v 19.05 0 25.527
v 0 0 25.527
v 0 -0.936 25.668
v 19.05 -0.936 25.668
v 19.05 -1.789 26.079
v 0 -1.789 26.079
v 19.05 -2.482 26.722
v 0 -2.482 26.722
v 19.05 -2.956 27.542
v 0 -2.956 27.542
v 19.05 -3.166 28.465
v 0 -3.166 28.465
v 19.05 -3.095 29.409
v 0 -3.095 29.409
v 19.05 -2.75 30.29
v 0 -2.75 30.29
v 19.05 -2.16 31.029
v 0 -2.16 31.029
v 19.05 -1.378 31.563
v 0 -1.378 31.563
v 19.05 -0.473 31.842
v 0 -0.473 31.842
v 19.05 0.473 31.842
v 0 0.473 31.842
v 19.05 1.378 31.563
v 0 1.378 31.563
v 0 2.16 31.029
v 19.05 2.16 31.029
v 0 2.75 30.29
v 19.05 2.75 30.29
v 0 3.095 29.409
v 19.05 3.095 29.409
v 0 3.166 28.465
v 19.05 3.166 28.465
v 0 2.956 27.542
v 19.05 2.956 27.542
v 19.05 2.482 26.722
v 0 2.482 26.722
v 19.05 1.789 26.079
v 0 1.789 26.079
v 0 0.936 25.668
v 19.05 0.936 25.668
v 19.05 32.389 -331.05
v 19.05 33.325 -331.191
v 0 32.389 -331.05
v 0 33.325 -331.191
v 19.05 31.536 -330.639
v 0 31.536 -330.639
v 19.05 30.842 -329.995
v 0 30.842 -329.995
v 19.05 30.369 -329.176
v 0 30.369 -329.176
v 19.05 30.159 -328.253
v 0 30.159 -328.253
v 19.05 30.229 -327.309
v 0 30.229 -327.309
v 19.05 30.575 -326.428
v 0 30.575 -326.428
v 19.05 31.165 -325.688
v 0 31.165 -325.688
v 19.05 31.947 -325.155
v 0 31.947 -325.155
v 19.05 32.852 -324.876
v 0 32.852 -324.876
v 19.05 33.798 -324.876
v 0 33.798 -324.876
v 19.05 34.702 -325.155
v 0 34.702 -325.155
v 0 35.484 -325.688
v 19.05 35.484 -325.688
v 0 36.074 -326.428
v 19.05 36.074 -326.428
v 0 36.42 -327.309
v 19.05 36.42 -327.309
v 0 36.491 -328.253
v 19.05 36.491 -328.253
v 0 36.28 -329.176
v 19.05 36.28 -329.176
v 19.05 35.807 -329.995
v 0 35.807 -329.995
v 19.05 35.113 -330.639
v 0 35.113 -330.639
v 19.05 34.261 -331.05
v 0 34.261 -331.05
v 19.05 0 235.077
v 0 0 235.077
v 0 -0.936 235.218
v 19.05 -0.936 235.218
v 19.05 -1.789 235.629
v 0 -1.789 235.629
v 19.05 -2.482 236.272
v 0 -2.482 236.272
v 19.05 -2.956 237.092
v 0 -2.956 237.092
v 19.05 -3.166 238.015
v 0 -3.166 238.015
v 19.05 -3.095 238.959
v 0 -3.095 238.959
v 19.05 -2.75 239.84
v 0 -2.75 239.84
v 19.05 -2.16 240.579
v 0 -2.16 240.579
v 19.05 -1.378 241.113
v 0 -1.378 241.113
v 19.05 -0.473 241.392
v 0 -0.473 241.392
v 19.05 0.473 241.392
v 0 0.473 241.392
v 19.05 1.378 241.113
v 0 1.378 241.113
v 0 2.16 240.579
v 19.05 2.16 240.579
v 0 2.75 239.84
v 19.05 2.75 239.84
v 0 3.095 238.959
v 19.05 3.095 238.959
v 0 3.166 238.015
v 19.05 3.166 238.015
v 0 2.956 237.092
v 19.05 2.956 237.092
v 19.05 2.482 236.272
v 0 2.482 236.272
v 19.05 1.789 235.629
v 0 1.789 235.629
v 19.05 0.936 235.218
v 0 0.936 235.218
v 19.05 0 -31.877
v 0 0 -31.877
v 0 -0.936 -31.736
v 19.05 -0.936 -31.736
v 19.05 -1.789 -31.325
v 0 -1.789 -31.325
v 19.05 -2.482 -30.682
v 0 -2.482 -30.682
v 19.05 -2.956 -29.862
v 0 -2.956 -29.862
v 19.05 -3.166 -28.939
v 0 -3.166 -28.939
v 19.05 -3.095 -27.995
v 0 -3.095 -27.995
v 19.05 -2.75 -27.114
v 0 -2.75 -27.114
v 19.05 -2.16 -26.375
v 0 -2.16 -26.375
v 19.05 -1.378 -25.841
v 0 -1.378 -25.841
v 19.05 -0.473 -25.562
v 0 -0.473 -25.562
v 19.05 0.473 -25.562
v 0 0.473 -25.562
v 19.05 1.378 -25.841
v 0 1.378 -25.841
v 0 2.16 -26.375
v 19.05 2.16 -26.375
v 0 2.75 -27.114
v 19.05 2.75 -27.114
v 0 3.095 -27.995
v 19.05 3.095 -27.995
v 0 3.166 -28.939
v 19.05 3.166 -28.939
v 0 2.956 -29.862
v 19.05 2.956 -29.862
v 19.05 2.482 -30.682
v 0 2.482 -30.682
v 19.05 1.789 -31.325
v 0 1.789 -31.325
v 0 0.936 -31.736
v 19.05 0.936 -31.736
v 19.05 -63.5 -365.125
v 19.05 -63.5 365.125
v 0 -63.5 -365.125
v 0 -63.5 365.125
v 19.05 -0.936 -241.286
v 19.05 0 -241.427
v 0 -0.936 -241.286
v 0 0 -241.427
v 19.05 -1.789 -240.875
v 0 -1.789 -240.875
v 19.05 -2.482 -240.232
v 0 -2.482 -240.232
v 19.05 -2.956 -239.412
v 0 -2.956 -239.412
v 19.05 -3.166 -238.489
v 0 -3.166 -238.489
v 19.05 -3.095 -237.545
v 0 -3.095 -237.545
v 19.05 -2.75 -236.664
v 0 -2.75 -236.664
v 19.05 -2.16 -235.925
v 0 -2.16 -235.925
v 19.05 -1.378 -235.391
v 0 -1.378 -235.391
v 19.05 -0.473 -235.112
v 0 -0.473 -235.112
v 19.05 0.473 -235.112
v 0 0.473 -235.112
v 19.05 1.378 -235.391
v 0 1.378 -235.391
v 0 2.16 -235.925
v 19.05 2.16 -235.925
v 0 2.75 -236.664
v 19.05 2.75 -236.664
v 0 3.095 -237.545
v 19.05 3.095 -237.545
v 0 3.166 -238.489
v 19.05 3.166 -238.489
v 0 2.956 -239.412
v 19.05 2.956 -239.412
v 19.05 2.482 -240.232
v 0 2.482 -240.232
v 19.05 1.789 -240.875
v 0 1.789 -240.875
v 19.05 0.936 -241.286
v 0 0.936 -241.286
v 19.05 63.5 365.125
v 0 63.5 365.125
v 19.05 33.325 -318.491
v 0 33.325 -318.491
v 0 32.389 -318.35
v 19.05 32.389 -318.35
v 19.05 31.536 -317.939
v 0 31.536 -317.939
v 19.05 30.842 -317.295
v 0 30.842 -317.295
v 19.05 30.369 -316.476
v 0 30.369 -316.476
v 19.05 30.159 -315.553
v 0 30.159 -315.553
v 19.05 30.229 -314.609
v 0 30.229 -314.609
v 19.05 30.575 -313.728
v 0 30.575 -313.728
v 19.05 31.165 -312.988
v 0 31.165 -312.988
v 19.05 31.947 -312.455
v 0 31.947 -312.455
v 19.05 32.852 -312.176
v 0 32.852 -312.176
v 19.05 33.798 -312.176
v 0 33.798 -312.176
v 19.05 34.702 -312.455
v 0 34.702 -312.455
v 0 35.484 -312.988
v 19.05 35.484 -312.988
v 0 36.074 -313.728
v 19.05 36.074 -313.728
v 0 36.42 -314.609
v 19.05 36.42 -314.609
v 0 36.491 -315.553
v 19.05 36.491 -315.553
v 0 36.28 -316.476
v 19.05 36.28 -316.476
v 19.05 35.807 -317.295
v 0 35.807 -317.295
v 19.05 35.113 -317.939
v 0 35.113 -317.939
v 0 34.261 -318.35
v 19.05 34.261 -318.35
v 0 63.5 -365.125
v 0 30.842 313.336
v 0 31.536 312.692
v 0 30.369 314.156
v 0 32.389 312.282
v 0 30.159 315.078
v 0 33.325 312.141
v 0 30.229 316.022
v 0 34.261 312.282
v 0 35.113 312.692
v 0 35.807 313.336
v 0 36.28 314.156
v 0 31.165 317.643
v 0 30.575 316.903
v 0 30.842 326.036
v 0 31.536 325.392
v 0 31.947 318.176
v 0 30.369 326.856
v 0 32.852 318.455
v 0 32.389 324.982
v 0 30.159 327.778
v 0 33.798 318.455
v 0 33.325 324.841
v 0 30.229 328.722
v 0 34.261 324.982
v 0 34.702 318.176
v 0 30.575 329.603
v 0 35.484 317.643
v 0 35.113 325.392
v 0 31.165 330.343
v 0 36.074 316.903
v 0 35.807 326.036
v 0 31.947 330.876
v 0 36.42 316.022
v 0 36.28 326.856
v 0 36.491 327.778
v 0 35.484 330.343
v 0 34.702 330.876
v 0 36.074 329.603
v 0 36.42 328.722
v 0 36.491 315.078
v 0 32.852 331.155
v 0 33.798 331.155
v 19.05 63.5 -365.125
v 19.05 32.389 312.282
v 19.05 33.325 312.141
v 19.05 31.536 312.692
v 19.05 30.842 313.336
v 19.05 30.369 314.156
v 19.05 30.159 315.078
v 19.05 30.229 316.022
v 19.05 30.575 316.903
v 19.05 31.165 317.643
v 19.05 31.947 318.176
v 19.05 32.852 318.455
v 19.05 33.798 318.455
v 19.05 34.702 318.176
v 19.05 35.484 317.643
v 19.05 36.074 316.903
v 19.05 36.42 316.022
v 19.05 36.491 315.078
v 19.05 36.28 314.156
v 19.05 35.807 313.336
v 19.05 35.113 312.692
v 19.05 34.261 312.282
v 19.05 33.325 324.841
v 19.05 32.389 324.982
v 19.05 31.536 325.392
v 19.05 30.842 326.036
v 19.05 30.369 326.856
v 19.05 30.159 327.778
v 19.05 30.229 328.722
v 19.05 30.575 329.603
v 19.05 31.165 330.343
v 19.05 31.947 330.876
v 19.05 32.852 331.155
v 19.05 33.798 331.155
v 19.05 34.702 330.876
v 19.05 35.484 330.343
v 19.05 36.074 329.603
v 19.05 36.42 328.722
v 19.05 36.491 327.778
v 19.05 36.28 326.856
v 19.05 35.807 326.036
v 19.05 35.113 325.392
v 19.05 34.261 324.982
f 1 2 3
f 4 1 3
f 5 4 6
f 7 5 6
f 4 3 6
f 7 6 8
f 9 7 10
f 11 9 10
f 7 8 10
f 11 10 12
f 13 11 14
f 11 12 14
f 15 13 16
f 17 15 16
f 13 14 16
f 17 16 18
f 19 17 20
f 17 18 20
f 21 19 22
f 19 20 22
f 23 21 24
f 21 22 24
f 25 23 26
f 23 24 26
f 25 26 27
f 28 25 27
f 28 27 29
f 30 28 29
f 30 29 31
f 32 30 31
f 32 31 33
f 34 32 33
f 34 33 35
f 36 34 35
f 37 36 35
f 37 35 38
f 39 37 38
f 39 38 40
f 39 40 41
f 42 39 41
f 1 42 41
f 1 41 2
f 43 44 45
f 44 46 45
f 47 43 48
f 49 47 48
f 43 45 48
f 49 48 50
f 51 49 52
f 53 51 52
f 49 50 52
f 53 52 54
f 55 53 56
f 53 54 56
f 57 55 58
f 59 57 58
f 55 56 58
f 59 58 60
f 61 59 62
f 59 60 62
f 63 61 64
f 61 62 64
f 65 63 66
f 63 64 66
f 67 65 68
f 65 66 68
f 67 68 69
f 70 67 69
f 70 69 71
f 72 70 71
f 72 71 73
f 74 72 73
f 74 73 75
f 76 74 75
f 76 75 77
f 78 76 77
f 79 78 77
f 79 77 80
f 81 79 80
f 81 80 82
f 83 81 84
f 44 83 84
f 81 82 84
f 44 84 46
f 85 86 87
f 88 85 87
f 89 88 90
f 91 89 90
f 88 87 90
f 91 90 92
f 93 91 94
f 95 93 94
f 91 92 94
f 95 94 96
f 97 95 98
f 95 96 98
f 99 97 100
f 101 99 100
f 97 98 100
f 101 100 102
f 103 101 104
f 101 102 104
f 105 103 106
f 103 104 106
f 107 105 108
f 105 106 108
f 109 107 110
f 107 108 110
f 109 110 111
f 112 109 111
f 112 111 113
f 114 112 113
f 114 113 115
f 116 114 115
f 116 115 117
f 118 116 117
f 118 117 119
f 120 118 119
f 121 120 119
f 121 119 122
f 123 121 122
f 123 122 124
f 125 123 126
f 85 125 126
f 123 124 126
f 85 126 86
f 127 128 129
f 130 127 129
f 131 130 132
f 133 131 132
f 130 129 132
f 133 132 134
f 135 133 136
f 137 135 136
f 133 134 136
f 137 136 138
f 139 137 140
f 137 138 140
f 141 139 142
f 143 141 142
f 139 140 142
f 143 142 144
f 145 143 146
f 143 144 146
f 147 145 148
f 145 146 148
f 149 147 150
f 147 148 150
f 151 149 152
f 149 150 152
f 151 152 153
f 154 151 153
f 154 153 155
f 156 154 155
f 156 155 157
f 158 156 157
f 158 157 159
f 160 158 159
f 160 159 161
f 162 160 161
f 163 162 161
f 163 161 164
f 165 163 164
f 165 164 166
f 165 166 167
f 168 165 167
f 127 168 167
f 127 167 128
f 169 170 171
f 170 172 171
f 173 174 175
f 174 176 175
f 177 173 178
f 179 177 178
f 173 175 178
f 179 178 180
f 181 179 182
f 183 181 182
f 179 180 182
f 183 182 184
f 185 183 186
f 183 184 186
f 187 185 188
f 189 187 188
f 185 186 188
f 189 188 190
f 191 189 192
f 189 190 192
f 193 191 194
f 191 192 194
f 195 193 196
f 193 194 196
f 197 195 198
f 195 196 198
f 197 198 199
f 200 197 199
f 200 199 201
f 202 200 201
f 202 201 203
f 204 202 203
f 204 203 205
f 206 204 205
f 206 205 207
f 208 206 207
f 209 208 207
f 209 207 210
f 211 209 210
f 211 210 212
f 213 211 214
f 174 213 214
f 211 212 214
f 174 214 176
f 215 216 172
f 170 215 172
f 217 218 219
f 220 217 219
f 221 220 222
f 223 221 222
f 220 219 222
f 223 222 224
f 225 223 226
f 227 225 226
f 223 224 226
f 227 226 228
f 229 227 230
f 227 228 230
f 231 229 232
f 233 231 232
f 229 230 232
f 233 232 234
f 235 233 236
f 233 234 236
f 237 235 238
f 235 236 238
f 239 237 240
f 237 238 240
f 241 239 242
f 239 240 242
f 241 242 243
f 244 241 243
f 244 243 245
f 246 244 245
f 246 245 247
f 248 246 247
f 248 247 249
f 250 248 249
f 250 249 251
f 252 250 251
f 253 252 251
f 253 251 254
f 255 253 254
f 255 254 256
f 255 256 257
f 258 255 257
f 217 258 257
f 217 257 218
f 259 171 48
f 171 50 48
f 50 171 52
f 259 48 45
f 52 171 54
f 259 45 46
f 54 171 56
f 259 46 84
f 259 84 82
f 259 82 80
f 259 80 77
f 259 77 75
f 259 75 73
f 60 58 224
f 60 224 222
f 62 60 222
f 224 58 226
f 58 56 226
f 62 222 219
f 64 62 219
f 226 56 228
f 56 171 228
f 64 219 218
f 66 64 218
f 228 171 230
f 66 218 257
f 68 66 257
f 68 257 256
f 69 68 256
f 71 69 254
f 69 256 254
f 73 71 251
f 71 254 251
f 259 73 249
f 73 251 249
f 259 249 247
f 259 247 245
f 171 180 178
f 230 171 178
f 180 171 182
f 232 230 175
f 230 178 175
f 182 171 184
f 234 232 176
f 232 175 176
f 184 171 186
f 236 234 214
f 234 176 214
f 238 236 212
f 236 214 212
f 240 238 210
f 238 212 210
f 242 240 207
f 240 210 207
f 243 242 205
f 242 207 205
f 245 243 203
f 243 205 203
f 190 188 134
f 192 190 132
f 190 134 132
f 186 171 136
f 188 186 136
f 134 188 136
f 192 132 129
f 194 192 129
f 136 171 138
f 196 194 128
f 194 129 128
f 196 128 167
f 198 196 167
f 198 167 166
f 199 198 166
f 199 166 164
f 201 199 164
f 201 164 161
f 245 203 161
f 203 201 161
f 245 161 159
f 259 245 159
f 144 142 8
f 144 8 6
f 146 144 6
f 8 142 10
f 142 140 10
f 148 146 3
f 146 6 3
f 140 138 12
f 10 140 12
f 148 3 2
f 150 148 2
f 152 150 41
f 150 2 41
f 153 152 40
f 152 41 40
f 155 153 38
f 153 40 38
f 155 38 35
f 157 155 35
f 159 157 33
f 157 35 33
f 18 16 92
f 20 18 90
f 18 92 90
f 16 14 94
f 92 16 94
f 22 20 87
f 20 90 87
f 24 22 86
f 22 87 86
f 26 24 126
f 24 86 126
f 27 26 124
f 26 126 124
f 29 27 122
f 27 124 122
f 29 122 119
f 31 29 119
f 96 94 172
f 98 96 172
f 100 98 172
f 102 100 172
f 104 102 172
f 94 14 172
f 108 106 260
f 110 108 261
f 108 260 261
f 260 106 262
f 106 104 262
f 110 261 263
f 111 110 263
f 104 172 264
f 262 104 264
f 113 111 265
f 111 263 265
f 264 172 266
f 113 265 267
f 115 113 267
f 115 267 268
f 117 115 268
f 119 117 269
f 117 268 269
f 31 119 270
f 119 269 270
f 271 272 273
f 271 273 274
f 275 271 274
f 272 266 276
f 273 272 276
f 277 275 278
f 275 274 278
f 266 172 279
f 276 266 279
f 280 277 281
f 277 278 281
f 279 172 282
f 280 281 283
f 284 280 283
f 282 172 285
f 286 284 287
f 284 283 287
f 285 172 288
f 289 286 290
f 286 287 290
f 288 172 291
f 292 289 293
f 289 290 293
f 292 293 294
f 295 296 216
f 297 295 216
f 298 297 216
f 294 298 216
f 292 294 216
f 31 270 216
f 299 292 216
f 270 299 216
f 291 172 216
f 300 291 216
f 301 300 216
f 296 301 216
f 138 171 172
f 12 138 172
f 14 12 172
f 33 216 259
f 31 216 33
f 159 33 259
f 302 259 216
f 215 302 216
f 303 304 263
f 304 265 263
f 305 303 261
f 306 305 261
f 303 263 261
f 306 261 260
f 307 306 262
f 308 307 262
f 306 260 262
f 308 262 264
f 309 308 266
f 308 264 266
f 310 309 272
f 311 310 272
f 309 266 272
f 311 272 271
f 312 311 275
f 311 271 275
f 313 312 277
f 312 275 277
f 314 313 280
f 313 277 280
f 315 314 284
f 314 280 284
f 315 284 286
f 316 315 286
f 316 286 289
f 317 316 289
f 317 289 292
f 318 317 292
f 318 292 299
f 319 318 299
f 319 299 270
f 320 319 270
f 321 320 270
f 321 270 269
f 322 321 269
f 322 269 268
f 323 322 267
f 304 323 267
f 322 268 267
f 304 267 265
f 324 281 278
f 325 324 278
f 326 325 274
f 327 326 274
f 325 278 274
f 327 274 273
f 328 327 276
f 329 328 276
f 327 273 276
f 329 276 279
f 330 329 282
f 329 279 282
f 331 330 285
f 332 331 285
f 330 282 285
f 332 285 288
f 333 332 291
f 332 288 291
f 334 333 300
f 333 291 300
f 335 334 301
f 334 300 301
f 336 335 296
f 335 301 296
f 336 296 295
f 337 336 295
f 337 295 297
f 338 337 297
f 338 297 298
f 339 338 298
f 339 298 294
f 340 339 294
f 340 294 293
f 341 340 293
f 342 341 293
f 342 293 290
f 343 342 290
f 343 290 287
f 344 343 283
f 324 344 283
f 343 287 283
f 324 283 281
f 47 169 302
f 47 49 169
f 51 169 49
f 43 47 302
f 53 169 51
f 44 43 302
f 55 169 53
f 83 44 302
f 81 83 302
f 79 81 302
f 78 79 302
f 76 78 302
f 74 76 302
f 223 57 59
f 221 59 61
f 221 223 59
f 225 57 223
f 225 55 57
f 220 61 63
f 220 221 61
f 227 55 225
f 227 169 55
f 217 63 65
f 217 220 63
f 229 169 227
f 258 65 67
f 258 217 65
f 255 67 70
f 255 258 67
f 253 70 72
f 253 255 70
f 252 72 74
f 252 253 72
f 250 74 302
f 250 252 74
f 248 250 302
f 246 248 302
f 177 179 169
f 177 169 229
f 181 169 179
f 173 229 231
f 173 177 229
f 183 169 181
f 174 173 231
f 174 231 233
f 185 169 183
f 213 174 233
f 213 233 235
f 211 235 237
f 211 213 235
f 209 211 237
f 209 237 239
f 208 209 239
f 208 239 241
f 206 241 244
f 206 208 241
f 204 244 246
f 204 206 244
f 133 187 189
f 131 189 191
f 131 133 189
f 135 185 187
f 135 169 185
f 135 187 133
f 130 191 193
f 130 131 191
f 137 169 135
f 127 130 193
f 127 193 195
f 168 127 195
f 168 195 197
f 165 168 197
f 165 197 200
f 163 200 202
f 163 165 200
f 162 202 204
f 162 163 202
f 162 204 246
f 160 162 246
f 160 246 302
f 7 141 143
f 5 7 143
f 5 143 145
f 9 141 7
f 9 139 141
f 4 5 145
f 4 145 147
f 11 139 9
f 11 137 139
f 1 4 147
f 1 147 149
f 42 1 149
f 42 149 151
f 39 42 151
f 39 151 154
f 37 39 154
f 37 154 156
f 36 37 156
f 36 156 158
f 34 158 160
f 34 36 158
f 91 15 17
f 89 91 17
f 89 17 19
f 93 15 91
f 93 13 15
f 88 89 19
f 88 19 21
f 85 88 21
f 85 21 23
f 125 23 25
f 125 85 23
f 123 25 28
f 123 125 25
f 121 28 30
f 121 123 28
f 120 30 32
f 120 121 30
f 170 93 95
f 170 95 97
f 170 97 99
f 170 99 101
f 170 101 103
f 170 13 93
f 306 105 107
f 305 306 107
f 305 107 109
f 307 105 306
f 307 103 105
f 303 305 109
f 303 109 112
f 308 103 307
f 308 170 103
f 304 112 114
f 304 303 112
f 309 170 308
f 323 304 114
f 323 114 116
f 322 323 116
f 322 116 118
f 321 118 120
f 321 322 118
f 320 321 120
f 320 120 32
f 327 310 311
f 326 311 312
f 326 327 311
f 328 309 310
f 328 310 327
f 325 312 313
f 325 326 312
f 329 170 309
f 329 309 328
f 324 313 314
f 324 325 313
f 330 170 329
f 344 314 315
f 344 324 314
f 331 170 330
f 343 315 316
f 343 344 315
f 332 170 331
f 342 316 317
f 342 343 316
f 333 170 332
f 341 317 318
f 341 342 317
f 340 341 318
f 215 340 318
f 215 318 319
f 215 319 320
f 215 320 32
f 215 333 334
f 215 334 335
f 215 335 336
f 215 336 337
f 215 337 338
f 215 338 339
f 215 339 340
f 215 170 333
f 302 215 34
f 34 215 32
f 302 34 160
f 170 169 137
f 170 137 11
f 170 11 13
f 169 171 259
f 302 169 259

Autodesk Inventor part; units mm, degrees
ref_plane "YZ Plane" through (0, 0, 0) normal (1, 0, 0) x (0, 1, 0)
ref_plane "XZ Plane" through (0, 0, 0) normal (0, 1, 0) x (-1, 0, 0)
ref_plane "XY Plane" through (0, 0, 0) normal (0, 0, 1) x (1, 0, 0)
sketch "Sketch1" plane through (0, 0, 0) normal (1, 0, 0) x (0, 1, 0)
  line L0 (-63.5, -365.125) -> (63.5, -365.125)
  line L1 (63.5, -365.125) -> (63.5, 365.125)
  line L2 (63.5, 365.125) -> (-63.5, 365.125)
  line L3 (-63.5, 365.125) -> (-63.5, -365.125)
  line L4 (-63.5, -365.125) -> (63.5, 365.125) construction
  line L5 (63.5, -365.125) -> (-63.5, 365.125) construction
  point P0 (0, 0)
  dimension "d0" = 127
  dimension "d1" = 730.25
extrude "Extrusion1" add sketch "Sketch1" along normal blind 19.05
sketch "Sketch2" plane through (19.05, 0, 0) normal (1, 0, 0) x (0, 0, -1)
  line L0 (-365.125, 63.5) -> (-365.125, -63.5) projected
  line L1 (365.125, 63.5) -> (-365.125, 63.5) projected
  line L2 (0, 63.5) -> (0, -57.15) construction
  point P0 (0, 0)
  point P1 (-328.0156, 33.3248)
  point P2 (-315.3156, 33.3248)
  point P3 (328.0156, 33.3248)
  point P4 (315.3156, 33.3248)
  dimension "d4" = 37.1094
  dimension "d5" = 12.7
  dimension "d6" = 30.1752
hole "Hole1" at (19.05, 33.3248, 328.0156) at (19.05, 33.3248, 315.3156) at (19.05, 33.3248, -328.0156) at (19.05, 33.3248, -315.3156) direction (-1, 0, 0) diameter 6.35 end through all
sketch "Sketch3" plane through (19.05, 0, 0) normal (1, 0, 0) x (0, 0, -1)
  line L0 (365.125, 63.5) -> (-365.125, 63.5) construction
  line L1 (0, 63.5) -> (0, -63.5) construction
  line L2 (-365.125, -63.5) -> (365.125, -63.5) construction
  line L3 (-365.125, 63.5) -> (-365.125, -63.5) construction
  point P0 (0, 0)
  point P1 (-238.252, 0)
  point P2 (-28.702, 0)
  point P3 (0, 0)
  point P4 (-365.125, 0)
  point P5 (-365.125, 0)
  point P6 (-365.125, 0)
  point P7 (238.252, 0)
  point P8 (28.702, 0)
  dimension "d16" = 126.873
  dimension "d17" = 209.55
hole "Hole2" at (19.05, 0, 238.252) at (19.05, 0, 28.702) at (19.05, 0, -238.252) at (19.05, 0, -28.702) direction (-1, 0, 0) diameter 6.35 end through all
properties part number "BP-002" material "Wood (Birch)"
